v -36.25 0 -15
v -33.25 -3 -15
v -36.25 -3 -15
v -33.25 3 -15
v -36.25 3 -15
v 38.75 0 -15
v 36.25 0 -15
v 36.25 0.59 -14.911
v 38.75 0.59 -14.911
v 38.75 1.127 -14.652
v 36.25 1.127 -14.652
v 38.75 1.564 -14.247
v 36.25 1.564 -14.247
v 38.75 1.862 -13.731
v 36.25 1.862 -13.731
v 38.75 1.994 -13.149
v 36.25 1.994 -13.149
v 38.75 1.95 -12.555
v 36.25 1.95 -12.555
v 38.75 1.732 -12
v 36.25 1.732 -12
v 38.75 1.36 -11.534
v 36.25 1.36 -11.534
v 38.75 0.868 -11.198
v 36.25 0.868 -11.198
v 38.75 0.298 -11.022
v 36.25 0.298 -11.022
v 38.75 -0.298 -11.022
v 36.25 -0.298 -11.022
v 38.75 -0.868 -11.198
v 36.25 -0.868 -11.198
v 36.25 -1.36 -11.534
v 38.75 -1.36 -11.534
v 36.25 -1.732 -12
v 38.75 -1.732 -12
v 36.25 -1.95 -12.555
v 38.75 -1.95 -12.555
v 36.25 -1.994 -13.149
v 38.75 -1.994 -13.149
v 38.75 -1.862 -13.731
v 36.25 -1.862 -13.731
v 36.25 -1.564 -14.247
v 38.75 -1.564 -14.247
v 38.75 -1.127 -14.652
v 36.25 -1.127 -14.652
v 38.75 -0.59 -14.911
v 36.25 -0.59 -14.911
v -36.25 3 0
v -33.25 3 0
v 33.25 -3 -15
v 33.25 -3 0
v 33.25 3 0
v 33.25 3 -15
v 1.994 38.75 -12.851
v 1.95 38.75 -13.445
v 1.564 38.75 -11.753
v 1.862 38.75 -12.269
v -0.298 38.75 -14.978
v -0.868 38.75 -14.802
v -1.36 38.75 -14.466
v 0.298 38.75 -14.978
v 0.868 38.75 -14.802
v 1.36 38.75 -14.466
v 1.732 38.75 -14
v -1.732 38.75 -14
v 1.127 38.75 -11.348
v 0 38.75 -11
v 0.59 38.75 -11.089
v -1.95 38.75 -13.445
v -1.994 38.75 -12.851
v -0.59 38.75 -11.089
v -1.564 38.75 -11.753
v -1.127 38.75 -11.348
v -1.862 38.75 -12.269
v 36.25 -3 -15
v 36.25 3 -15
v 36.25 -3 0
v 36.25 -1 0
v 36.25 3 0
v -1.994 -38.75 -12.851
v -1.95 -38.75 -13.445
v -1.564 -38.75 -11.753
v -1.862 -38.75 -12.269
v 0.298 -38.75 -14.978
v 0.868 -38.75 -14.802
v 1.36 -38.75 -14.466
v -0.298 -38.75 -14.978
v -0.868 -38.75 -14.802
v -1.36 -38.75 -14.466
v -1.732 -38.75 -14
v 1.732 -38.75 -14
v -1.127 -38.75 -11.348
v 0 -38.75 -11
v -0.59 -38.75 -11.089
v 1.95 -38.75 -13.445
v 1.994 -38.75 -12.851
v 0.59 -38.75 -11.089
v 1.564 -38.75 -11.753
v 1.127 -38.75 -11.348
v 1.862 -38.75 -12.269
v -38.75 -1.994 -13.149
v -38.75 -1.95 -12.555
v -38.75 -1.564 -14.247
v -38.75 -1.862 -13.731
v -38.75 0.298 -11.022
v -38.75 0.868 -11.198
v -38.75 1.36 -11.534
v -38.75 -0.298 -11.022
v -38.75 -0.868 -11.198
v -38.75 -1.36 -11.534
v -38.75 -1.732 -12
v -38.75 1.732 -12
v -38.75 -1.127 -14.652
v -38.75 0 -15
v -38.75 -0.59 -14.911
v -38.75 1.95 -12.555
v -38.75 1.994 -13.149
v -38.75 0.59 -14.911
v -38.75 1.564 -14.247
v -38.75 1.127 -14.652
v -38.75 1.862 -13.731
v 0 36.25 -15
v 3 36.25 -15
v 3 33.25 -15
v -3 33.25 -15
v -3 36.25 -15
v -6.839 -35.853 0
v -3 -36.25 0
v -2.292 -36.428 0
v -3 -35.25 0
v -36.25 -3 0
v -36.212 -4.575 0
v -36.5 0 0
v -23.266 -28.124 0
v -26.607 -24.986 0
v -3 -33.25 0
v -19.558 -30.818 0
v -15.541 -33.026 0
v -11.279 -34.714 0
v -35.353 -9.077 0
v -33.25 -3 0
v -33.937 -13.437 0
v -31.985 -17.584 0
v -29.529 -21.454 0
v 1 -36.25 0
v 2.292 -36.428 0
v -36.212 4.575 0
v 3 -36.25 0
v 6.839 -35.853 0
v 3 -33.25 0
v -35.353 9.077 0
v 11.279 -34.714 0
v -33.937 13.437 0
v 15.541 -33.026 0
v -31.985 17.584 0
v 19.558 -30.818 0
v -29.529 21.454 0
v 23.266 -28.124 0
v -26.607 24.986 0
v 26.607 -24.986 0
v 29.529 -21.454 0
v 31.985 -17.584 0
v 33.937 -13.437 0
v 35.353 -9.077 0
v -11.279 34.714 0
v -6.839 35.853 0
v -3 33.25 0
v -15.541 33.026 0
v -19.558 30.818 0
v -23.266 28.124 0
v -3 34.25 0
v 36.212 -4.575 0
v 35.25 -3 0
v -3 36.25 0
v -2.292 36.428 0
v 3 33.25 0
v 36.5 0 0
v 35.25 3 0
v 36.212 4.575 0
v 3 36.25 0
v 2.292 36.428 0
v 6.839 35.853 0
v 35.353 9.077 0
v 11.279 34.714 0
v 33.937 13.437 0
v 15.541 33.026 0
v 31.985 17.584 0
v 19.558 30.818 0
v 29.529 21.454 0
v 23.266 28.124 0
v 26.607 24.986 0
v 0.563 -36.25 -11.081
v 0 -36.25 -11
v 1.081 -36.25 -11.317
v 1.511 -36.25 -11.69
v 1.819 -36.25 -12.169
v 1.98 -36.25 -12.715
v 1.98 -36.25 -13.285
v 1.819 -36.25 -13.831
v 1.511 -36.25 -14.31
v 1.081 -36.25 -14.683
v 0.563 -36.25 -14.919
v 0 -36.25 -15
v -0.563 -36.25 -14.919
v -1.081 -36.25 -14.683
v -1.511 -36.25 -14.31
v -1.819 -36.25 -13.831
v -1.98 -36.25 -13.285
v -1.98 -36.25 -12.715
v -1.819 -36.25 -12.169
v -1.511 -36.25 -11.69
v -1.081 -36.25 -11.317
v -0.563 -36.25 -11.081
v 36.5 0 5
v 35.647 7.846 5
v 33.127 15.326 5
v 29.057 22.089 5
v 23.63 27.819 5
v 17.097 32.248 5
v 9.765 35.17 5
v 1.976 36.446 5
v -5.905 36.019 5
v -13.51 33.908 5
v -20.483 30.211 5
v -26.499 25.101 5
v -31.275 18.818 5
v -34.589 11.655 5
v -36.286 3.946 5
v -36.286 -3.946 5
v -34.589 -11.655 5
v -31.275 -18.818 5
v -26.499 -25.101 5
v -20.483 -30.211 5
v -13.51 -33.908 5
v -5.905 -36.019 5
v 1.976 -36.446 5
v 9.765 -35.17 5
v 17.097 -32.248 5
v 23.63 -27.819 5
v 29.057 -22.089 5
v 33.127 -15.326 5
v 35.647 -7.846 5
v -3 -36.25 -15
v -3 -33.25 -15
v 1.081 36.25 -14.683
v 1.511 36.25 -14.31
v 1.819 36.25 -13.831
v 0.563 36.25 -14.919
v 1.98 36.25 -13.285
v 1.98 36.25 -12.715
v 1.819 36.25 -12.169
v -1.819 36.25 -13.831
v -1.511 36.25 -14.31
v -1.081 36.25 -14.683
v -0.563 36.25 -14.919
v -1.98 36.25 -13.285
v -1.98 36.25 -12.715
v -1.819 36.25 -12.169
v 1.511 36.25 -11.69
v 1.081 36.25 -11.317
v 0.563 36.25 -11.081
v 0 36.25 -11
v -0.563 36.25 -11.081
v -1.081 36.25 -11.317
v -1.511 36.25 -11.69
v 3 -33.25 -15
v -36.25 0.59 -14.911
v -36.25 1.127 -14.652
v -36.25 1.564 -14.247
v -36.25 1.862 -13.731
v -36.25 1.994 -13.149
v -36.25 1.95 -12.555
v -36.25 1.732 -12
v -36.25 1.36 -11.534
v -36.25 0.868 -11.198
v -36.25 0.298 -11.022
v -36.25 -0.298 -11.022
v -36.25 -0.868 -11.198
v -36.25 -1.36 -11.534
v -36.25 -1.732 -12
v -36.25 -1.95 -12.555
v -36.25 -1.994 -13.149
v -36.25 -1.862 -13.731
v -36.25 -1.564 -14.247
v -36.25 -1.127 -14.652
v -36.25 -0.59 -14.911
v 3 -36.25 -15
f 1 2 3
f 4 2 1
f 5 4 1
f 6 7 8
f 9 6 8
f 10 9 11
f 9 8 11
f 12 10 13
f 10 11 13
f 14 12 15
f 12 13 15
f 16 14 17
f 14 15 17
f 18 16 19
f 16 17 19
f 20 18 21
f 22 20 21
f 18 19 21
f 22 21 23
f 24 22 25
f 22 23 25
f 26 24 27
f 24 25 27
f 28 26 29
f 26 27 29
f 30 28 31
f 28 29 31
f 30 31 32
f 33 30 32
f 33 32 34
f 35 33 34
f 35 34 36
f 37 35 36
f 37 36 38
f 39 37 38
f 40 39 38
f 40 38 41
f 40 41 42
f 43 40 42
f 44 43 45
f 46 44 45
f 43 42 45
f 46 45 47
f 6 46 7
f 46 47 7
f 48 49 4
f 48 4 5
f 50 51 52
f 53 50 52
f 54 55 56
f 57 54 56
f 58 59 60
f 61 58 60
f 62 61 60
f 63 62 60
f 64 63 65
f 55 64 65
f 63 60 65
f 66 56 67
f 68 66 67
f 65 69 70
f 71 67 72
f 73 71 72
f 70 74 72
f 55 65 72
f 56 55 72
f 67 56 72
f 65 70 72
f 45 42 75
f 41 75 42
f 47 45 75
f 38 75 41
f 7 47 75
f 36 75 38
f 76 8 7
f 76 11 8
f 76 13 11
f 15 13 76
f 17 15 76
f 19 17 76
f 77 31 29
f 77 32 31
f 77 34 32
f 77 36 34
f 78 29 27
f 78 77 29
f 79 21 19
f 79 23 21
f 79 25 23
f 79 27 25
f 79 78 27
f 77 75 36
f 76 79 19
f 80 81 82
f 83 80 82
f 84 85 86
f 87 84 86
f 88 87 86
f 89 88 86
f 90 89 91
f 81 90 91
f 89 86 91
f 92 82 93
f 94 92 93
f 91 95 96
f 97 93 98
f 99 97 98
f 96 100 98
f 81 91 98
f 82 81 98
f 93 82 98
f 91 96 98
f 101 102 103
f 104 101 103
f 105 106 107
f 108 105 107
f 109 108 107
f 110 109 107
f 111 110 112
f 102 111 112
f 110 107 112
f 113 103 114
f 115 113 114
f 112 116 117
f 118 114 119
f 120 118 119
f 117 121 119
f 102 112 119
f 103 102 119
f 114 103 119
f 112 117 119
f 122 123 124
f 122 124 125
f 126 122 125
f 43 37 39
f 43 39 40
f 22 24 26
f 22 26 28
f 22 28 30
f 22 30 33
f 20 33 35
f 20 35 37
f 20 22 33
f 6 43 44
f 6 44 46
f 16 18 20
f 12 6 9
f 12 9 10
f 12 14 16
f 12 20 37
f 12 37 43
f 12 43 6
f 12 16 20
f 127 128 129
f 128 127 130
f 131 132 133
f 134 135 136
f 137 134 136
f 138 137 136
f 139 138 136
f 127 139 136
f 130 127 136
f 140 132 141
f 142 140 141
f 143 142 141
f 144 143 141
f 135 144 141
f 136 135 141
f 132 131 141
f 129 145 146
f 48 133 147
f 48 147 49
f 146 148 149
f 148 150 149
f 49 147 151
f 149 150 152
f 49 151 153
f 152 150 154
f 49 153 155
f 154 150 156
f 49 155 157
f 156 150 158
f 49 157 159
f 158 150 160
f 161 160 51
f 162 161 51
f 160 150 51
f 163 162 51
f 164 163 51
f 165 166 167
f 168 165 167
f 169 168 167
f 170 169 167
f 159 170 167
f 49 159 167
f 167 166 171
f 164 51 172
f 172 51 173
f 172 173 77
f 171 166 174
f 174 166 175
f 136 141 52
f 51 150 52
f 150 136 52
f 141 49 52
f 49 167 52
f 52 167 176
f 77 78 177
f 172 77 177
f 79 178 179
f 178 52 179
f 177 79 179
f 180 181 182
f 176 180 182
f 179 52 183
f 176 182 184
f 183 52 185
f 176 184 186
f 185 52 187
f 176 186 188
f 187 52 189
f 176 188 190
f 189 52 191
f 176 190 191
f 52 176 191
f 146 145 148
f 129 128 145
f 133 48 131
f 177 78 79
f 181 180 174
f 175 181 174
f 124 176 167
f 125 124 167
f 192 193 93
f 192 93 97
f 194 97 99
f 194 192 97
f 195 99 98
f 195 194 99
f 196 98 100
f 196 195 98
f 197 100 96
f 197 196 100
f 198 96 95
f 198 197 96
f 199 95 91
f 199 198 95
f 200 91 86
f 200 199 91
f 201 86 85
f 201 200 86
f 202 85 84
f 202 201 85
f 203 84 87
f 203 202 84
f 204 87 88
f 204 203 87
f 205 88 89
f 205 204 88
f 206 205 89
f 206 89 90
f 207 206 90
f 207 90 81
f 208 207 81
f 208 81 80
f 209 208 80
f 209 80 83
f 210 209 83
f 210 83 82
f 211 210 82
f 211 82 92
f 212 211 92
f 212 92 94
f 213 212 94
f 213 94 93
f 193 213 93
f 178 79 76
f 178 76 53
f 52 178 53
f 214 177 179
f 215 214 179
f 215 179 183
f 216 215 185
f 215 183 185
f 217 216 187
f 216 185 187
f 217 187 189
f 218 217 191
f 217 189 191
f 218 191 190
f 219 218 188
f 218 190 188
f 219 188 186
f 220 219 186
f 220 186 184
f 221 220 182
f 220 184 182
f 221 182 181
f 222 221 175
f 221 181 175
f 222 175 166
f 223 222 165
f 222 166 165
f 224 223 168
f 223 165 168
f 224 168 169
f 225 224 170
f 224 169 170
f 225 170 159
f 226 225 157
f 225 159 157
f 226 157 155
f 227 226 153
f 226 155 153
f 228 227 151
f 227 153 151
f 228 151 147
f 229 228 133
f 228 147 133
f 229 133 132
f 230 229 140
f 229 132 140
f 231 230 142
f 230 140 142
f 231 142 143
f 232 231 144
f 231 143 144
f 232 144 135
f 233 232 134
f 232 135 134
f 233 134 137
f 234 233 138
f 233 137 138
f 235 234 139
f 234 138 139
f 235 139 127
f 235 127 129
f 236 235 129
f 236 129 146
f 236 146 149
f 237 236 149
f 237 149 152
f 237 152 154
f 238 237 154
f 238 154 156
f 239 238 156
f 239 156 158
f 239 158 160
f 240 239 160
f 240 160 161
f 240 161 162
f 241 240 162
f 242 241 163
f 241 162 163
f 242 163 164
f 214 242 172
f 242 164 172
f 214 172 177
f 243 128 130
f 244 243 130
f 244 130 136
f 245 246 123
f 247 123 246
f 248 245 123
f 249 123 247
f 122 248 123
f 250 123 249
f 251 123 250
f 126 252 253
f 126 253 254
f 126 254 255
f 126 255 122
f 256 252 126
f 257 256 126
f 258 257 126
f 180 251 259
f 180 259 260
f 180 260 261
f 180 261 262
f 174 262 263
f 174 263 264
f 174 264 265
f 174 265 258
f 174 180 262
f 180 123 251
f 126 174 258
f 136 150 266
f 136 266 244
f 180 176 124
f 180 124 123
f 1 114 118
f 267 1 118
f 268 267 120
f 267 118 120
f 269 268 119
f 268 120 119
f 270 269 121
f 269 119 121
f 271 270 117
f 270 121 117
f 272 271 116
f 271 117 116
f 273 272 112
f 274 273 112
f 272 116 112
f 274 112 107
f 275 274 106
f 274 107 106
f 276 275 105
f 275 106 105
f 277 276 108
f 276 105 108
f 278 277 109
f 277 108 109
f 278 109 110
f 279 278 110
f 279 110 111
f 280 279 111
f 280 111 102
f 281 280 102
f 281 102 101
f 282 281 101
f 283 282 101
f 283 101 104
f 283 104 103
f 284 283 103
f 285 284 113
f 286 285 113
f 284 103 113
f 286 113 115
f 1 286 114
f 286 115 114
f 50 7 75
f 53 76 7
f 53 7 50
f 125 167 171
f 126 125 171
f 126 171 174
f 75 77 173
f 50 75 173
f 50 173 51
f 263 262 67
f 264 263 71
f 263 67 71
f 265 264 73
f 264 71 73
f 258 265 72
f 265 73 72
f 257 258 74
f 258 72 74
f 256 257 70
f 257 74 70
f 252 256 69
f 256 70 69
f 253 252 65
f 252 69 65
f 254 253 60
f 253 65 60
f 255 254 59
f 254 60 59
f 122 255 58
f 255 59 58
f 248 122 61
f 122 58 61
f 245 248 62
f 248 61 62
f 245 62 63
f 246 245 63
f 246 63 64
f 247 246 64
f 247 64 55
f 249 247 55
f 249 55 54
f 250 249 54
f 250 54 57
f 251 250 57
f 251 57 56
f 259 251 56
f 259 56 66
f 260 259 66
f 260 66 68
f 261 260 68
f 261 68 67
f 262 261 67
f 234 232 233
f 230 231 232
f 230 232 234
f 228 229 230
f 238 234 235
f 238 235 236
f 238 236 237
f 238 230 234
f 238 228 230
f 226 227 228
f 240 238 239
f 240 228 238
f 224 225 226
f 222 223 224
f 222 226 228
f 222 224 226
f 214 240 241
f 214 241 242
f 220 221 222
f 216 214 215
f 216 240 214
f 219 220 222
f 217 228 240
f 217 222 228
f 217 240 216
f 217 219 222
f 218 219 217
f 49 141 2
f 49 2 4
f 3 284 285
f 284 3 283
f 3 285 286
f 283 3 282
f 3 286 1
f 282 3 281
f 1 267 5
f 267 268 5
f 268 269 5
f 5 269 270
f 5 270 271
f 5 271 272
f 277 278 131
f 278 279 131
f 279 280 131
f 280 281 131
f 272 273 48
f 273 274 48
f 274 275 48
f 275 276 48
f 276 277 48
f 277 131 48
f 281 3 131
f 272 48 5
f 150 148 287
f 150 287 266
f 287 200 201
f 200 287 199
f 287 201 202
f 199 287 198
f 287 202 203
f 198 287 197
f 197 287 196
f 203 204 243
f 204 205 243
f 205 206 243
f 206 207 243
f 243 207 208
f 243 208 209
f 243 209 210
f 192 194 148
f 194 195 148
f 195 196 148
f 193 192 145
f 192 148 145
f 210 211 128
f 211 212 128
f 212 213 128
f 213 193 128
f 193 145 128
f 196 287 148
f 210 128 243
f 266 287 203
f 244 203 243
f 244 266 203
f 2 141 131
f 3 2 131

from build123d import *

# Parameters (mm, degrees)
SKETCH1_R            = 36.5
BOSS_EXTRUDE1_DEPTH  = 5
SKETCH4_W            = 3
SKETCH4_H            = 6
SKETCH4_W_2          = 6
SKETCH4_H_2          = 3
BOSS_EXTRUDE4_DEPTH  = 15
SKETCH6_R            = 2
BOSS_EXTRUDE6_DEPTH  = 2.5
SKETCH7_R            = 2
BOSS_EXTRUDE8_DEPTH  = 2.5
BOSS_EXTRUDE9_START  = -2.5
SKETCH9_R            = 2
BOSS_EXTRUDE9_DEPTH  = 2.5
BOSS_EXTRUDE10_START = -2.5
SKETCH10_R           = 2
BOSS_EXTRUDE10_DEPTH = 2.5


with BuildPart() as part:
    # Sketch1 → Boss-Extrude1 (new body)
    with BuildSketch(Plane.XY):
        Circle(SKETCH1_R)
    extrude(amount=BOSS_EXTRUDE1_DEPTH)

    # Sketch4 → Boss-Extrude4 (add)
    with BuildSketch(Plane(origin=(0, 0, 0), x_dir=(-1, 0, 0), z_dir=(0, 0, -1))):
        with Locations((-34.75, 0)):
            Rectangle(SKETCH4_W, SKETCH4_H)
        with Locations((34.75, 0)):
            Rectangle(SKETCH4_W, SKETCH4_H)
        with Locations((0, 34.75)):
            Rectangle(SKETCH4_W_2, SKETCH4_H_2)
        with Locations((0, -34.75)):
            Rectangle(SKETCH4_W_2, SKETCH4_H_2)
    extrude(amount=BOSS_EXTRUDE4_DEPTH)

    # Sketch6 → Boss-Extrude6 (add)
    with BuildSketch(Plane(origin=(36.25, 0, 0), x_dir=(0, 0, -1), z_dir=(1, 0, 0))):
        with Locations((13, 0)):
            Circle(SKETCH6_R)
    extrude(amount=BOSS_EXTRUDE6_DEPTH)

    # Sketch7 → Boss-Extrude8 (add)
    with BuildSketch(Plane(origin=(0, -36.25, -62.5), x_dir=(1, 0, 0), z_dir=(0, 1, 0))):
        with Locations(Location((0, -49.5, 0), (0, 0, 270))):
            Circle(SKETCH7_R)
    extrude(amount=-BOSS_EXTRUDE8_DEPTH)

    # Sketch9 → Boss-Extrude9 (add)
    with BuildSketch(Plane(origin=(-36.25, 0, -62.5), x_dir=(0, 0, -1), z_dir=(1, 0, 0)).offset(BOSS_EXTRUDE9_START)):
        with Locations((-49.5, 0)):
            Circle(SKETCH9_R)
    extrude(amount=BOSS_EXTRUDE9_DEPTH)

    # Sketch10 → Boss-Extrude10 (add)
    with BuildSketch(Plane(origin=(0, 36.25, 0), x_dir=(-1, 0, 0), z_dir=(0, -1, 0)).offset(BOSS_EXTRUDE10_START)):
        with Locations(Location((0, 13, 0), (0, 0, 270))):
            Circle(SKETCH10_R)
    extrude(amount=BOSS_EXTRUDE10_DEPTH)


solid = part.part
